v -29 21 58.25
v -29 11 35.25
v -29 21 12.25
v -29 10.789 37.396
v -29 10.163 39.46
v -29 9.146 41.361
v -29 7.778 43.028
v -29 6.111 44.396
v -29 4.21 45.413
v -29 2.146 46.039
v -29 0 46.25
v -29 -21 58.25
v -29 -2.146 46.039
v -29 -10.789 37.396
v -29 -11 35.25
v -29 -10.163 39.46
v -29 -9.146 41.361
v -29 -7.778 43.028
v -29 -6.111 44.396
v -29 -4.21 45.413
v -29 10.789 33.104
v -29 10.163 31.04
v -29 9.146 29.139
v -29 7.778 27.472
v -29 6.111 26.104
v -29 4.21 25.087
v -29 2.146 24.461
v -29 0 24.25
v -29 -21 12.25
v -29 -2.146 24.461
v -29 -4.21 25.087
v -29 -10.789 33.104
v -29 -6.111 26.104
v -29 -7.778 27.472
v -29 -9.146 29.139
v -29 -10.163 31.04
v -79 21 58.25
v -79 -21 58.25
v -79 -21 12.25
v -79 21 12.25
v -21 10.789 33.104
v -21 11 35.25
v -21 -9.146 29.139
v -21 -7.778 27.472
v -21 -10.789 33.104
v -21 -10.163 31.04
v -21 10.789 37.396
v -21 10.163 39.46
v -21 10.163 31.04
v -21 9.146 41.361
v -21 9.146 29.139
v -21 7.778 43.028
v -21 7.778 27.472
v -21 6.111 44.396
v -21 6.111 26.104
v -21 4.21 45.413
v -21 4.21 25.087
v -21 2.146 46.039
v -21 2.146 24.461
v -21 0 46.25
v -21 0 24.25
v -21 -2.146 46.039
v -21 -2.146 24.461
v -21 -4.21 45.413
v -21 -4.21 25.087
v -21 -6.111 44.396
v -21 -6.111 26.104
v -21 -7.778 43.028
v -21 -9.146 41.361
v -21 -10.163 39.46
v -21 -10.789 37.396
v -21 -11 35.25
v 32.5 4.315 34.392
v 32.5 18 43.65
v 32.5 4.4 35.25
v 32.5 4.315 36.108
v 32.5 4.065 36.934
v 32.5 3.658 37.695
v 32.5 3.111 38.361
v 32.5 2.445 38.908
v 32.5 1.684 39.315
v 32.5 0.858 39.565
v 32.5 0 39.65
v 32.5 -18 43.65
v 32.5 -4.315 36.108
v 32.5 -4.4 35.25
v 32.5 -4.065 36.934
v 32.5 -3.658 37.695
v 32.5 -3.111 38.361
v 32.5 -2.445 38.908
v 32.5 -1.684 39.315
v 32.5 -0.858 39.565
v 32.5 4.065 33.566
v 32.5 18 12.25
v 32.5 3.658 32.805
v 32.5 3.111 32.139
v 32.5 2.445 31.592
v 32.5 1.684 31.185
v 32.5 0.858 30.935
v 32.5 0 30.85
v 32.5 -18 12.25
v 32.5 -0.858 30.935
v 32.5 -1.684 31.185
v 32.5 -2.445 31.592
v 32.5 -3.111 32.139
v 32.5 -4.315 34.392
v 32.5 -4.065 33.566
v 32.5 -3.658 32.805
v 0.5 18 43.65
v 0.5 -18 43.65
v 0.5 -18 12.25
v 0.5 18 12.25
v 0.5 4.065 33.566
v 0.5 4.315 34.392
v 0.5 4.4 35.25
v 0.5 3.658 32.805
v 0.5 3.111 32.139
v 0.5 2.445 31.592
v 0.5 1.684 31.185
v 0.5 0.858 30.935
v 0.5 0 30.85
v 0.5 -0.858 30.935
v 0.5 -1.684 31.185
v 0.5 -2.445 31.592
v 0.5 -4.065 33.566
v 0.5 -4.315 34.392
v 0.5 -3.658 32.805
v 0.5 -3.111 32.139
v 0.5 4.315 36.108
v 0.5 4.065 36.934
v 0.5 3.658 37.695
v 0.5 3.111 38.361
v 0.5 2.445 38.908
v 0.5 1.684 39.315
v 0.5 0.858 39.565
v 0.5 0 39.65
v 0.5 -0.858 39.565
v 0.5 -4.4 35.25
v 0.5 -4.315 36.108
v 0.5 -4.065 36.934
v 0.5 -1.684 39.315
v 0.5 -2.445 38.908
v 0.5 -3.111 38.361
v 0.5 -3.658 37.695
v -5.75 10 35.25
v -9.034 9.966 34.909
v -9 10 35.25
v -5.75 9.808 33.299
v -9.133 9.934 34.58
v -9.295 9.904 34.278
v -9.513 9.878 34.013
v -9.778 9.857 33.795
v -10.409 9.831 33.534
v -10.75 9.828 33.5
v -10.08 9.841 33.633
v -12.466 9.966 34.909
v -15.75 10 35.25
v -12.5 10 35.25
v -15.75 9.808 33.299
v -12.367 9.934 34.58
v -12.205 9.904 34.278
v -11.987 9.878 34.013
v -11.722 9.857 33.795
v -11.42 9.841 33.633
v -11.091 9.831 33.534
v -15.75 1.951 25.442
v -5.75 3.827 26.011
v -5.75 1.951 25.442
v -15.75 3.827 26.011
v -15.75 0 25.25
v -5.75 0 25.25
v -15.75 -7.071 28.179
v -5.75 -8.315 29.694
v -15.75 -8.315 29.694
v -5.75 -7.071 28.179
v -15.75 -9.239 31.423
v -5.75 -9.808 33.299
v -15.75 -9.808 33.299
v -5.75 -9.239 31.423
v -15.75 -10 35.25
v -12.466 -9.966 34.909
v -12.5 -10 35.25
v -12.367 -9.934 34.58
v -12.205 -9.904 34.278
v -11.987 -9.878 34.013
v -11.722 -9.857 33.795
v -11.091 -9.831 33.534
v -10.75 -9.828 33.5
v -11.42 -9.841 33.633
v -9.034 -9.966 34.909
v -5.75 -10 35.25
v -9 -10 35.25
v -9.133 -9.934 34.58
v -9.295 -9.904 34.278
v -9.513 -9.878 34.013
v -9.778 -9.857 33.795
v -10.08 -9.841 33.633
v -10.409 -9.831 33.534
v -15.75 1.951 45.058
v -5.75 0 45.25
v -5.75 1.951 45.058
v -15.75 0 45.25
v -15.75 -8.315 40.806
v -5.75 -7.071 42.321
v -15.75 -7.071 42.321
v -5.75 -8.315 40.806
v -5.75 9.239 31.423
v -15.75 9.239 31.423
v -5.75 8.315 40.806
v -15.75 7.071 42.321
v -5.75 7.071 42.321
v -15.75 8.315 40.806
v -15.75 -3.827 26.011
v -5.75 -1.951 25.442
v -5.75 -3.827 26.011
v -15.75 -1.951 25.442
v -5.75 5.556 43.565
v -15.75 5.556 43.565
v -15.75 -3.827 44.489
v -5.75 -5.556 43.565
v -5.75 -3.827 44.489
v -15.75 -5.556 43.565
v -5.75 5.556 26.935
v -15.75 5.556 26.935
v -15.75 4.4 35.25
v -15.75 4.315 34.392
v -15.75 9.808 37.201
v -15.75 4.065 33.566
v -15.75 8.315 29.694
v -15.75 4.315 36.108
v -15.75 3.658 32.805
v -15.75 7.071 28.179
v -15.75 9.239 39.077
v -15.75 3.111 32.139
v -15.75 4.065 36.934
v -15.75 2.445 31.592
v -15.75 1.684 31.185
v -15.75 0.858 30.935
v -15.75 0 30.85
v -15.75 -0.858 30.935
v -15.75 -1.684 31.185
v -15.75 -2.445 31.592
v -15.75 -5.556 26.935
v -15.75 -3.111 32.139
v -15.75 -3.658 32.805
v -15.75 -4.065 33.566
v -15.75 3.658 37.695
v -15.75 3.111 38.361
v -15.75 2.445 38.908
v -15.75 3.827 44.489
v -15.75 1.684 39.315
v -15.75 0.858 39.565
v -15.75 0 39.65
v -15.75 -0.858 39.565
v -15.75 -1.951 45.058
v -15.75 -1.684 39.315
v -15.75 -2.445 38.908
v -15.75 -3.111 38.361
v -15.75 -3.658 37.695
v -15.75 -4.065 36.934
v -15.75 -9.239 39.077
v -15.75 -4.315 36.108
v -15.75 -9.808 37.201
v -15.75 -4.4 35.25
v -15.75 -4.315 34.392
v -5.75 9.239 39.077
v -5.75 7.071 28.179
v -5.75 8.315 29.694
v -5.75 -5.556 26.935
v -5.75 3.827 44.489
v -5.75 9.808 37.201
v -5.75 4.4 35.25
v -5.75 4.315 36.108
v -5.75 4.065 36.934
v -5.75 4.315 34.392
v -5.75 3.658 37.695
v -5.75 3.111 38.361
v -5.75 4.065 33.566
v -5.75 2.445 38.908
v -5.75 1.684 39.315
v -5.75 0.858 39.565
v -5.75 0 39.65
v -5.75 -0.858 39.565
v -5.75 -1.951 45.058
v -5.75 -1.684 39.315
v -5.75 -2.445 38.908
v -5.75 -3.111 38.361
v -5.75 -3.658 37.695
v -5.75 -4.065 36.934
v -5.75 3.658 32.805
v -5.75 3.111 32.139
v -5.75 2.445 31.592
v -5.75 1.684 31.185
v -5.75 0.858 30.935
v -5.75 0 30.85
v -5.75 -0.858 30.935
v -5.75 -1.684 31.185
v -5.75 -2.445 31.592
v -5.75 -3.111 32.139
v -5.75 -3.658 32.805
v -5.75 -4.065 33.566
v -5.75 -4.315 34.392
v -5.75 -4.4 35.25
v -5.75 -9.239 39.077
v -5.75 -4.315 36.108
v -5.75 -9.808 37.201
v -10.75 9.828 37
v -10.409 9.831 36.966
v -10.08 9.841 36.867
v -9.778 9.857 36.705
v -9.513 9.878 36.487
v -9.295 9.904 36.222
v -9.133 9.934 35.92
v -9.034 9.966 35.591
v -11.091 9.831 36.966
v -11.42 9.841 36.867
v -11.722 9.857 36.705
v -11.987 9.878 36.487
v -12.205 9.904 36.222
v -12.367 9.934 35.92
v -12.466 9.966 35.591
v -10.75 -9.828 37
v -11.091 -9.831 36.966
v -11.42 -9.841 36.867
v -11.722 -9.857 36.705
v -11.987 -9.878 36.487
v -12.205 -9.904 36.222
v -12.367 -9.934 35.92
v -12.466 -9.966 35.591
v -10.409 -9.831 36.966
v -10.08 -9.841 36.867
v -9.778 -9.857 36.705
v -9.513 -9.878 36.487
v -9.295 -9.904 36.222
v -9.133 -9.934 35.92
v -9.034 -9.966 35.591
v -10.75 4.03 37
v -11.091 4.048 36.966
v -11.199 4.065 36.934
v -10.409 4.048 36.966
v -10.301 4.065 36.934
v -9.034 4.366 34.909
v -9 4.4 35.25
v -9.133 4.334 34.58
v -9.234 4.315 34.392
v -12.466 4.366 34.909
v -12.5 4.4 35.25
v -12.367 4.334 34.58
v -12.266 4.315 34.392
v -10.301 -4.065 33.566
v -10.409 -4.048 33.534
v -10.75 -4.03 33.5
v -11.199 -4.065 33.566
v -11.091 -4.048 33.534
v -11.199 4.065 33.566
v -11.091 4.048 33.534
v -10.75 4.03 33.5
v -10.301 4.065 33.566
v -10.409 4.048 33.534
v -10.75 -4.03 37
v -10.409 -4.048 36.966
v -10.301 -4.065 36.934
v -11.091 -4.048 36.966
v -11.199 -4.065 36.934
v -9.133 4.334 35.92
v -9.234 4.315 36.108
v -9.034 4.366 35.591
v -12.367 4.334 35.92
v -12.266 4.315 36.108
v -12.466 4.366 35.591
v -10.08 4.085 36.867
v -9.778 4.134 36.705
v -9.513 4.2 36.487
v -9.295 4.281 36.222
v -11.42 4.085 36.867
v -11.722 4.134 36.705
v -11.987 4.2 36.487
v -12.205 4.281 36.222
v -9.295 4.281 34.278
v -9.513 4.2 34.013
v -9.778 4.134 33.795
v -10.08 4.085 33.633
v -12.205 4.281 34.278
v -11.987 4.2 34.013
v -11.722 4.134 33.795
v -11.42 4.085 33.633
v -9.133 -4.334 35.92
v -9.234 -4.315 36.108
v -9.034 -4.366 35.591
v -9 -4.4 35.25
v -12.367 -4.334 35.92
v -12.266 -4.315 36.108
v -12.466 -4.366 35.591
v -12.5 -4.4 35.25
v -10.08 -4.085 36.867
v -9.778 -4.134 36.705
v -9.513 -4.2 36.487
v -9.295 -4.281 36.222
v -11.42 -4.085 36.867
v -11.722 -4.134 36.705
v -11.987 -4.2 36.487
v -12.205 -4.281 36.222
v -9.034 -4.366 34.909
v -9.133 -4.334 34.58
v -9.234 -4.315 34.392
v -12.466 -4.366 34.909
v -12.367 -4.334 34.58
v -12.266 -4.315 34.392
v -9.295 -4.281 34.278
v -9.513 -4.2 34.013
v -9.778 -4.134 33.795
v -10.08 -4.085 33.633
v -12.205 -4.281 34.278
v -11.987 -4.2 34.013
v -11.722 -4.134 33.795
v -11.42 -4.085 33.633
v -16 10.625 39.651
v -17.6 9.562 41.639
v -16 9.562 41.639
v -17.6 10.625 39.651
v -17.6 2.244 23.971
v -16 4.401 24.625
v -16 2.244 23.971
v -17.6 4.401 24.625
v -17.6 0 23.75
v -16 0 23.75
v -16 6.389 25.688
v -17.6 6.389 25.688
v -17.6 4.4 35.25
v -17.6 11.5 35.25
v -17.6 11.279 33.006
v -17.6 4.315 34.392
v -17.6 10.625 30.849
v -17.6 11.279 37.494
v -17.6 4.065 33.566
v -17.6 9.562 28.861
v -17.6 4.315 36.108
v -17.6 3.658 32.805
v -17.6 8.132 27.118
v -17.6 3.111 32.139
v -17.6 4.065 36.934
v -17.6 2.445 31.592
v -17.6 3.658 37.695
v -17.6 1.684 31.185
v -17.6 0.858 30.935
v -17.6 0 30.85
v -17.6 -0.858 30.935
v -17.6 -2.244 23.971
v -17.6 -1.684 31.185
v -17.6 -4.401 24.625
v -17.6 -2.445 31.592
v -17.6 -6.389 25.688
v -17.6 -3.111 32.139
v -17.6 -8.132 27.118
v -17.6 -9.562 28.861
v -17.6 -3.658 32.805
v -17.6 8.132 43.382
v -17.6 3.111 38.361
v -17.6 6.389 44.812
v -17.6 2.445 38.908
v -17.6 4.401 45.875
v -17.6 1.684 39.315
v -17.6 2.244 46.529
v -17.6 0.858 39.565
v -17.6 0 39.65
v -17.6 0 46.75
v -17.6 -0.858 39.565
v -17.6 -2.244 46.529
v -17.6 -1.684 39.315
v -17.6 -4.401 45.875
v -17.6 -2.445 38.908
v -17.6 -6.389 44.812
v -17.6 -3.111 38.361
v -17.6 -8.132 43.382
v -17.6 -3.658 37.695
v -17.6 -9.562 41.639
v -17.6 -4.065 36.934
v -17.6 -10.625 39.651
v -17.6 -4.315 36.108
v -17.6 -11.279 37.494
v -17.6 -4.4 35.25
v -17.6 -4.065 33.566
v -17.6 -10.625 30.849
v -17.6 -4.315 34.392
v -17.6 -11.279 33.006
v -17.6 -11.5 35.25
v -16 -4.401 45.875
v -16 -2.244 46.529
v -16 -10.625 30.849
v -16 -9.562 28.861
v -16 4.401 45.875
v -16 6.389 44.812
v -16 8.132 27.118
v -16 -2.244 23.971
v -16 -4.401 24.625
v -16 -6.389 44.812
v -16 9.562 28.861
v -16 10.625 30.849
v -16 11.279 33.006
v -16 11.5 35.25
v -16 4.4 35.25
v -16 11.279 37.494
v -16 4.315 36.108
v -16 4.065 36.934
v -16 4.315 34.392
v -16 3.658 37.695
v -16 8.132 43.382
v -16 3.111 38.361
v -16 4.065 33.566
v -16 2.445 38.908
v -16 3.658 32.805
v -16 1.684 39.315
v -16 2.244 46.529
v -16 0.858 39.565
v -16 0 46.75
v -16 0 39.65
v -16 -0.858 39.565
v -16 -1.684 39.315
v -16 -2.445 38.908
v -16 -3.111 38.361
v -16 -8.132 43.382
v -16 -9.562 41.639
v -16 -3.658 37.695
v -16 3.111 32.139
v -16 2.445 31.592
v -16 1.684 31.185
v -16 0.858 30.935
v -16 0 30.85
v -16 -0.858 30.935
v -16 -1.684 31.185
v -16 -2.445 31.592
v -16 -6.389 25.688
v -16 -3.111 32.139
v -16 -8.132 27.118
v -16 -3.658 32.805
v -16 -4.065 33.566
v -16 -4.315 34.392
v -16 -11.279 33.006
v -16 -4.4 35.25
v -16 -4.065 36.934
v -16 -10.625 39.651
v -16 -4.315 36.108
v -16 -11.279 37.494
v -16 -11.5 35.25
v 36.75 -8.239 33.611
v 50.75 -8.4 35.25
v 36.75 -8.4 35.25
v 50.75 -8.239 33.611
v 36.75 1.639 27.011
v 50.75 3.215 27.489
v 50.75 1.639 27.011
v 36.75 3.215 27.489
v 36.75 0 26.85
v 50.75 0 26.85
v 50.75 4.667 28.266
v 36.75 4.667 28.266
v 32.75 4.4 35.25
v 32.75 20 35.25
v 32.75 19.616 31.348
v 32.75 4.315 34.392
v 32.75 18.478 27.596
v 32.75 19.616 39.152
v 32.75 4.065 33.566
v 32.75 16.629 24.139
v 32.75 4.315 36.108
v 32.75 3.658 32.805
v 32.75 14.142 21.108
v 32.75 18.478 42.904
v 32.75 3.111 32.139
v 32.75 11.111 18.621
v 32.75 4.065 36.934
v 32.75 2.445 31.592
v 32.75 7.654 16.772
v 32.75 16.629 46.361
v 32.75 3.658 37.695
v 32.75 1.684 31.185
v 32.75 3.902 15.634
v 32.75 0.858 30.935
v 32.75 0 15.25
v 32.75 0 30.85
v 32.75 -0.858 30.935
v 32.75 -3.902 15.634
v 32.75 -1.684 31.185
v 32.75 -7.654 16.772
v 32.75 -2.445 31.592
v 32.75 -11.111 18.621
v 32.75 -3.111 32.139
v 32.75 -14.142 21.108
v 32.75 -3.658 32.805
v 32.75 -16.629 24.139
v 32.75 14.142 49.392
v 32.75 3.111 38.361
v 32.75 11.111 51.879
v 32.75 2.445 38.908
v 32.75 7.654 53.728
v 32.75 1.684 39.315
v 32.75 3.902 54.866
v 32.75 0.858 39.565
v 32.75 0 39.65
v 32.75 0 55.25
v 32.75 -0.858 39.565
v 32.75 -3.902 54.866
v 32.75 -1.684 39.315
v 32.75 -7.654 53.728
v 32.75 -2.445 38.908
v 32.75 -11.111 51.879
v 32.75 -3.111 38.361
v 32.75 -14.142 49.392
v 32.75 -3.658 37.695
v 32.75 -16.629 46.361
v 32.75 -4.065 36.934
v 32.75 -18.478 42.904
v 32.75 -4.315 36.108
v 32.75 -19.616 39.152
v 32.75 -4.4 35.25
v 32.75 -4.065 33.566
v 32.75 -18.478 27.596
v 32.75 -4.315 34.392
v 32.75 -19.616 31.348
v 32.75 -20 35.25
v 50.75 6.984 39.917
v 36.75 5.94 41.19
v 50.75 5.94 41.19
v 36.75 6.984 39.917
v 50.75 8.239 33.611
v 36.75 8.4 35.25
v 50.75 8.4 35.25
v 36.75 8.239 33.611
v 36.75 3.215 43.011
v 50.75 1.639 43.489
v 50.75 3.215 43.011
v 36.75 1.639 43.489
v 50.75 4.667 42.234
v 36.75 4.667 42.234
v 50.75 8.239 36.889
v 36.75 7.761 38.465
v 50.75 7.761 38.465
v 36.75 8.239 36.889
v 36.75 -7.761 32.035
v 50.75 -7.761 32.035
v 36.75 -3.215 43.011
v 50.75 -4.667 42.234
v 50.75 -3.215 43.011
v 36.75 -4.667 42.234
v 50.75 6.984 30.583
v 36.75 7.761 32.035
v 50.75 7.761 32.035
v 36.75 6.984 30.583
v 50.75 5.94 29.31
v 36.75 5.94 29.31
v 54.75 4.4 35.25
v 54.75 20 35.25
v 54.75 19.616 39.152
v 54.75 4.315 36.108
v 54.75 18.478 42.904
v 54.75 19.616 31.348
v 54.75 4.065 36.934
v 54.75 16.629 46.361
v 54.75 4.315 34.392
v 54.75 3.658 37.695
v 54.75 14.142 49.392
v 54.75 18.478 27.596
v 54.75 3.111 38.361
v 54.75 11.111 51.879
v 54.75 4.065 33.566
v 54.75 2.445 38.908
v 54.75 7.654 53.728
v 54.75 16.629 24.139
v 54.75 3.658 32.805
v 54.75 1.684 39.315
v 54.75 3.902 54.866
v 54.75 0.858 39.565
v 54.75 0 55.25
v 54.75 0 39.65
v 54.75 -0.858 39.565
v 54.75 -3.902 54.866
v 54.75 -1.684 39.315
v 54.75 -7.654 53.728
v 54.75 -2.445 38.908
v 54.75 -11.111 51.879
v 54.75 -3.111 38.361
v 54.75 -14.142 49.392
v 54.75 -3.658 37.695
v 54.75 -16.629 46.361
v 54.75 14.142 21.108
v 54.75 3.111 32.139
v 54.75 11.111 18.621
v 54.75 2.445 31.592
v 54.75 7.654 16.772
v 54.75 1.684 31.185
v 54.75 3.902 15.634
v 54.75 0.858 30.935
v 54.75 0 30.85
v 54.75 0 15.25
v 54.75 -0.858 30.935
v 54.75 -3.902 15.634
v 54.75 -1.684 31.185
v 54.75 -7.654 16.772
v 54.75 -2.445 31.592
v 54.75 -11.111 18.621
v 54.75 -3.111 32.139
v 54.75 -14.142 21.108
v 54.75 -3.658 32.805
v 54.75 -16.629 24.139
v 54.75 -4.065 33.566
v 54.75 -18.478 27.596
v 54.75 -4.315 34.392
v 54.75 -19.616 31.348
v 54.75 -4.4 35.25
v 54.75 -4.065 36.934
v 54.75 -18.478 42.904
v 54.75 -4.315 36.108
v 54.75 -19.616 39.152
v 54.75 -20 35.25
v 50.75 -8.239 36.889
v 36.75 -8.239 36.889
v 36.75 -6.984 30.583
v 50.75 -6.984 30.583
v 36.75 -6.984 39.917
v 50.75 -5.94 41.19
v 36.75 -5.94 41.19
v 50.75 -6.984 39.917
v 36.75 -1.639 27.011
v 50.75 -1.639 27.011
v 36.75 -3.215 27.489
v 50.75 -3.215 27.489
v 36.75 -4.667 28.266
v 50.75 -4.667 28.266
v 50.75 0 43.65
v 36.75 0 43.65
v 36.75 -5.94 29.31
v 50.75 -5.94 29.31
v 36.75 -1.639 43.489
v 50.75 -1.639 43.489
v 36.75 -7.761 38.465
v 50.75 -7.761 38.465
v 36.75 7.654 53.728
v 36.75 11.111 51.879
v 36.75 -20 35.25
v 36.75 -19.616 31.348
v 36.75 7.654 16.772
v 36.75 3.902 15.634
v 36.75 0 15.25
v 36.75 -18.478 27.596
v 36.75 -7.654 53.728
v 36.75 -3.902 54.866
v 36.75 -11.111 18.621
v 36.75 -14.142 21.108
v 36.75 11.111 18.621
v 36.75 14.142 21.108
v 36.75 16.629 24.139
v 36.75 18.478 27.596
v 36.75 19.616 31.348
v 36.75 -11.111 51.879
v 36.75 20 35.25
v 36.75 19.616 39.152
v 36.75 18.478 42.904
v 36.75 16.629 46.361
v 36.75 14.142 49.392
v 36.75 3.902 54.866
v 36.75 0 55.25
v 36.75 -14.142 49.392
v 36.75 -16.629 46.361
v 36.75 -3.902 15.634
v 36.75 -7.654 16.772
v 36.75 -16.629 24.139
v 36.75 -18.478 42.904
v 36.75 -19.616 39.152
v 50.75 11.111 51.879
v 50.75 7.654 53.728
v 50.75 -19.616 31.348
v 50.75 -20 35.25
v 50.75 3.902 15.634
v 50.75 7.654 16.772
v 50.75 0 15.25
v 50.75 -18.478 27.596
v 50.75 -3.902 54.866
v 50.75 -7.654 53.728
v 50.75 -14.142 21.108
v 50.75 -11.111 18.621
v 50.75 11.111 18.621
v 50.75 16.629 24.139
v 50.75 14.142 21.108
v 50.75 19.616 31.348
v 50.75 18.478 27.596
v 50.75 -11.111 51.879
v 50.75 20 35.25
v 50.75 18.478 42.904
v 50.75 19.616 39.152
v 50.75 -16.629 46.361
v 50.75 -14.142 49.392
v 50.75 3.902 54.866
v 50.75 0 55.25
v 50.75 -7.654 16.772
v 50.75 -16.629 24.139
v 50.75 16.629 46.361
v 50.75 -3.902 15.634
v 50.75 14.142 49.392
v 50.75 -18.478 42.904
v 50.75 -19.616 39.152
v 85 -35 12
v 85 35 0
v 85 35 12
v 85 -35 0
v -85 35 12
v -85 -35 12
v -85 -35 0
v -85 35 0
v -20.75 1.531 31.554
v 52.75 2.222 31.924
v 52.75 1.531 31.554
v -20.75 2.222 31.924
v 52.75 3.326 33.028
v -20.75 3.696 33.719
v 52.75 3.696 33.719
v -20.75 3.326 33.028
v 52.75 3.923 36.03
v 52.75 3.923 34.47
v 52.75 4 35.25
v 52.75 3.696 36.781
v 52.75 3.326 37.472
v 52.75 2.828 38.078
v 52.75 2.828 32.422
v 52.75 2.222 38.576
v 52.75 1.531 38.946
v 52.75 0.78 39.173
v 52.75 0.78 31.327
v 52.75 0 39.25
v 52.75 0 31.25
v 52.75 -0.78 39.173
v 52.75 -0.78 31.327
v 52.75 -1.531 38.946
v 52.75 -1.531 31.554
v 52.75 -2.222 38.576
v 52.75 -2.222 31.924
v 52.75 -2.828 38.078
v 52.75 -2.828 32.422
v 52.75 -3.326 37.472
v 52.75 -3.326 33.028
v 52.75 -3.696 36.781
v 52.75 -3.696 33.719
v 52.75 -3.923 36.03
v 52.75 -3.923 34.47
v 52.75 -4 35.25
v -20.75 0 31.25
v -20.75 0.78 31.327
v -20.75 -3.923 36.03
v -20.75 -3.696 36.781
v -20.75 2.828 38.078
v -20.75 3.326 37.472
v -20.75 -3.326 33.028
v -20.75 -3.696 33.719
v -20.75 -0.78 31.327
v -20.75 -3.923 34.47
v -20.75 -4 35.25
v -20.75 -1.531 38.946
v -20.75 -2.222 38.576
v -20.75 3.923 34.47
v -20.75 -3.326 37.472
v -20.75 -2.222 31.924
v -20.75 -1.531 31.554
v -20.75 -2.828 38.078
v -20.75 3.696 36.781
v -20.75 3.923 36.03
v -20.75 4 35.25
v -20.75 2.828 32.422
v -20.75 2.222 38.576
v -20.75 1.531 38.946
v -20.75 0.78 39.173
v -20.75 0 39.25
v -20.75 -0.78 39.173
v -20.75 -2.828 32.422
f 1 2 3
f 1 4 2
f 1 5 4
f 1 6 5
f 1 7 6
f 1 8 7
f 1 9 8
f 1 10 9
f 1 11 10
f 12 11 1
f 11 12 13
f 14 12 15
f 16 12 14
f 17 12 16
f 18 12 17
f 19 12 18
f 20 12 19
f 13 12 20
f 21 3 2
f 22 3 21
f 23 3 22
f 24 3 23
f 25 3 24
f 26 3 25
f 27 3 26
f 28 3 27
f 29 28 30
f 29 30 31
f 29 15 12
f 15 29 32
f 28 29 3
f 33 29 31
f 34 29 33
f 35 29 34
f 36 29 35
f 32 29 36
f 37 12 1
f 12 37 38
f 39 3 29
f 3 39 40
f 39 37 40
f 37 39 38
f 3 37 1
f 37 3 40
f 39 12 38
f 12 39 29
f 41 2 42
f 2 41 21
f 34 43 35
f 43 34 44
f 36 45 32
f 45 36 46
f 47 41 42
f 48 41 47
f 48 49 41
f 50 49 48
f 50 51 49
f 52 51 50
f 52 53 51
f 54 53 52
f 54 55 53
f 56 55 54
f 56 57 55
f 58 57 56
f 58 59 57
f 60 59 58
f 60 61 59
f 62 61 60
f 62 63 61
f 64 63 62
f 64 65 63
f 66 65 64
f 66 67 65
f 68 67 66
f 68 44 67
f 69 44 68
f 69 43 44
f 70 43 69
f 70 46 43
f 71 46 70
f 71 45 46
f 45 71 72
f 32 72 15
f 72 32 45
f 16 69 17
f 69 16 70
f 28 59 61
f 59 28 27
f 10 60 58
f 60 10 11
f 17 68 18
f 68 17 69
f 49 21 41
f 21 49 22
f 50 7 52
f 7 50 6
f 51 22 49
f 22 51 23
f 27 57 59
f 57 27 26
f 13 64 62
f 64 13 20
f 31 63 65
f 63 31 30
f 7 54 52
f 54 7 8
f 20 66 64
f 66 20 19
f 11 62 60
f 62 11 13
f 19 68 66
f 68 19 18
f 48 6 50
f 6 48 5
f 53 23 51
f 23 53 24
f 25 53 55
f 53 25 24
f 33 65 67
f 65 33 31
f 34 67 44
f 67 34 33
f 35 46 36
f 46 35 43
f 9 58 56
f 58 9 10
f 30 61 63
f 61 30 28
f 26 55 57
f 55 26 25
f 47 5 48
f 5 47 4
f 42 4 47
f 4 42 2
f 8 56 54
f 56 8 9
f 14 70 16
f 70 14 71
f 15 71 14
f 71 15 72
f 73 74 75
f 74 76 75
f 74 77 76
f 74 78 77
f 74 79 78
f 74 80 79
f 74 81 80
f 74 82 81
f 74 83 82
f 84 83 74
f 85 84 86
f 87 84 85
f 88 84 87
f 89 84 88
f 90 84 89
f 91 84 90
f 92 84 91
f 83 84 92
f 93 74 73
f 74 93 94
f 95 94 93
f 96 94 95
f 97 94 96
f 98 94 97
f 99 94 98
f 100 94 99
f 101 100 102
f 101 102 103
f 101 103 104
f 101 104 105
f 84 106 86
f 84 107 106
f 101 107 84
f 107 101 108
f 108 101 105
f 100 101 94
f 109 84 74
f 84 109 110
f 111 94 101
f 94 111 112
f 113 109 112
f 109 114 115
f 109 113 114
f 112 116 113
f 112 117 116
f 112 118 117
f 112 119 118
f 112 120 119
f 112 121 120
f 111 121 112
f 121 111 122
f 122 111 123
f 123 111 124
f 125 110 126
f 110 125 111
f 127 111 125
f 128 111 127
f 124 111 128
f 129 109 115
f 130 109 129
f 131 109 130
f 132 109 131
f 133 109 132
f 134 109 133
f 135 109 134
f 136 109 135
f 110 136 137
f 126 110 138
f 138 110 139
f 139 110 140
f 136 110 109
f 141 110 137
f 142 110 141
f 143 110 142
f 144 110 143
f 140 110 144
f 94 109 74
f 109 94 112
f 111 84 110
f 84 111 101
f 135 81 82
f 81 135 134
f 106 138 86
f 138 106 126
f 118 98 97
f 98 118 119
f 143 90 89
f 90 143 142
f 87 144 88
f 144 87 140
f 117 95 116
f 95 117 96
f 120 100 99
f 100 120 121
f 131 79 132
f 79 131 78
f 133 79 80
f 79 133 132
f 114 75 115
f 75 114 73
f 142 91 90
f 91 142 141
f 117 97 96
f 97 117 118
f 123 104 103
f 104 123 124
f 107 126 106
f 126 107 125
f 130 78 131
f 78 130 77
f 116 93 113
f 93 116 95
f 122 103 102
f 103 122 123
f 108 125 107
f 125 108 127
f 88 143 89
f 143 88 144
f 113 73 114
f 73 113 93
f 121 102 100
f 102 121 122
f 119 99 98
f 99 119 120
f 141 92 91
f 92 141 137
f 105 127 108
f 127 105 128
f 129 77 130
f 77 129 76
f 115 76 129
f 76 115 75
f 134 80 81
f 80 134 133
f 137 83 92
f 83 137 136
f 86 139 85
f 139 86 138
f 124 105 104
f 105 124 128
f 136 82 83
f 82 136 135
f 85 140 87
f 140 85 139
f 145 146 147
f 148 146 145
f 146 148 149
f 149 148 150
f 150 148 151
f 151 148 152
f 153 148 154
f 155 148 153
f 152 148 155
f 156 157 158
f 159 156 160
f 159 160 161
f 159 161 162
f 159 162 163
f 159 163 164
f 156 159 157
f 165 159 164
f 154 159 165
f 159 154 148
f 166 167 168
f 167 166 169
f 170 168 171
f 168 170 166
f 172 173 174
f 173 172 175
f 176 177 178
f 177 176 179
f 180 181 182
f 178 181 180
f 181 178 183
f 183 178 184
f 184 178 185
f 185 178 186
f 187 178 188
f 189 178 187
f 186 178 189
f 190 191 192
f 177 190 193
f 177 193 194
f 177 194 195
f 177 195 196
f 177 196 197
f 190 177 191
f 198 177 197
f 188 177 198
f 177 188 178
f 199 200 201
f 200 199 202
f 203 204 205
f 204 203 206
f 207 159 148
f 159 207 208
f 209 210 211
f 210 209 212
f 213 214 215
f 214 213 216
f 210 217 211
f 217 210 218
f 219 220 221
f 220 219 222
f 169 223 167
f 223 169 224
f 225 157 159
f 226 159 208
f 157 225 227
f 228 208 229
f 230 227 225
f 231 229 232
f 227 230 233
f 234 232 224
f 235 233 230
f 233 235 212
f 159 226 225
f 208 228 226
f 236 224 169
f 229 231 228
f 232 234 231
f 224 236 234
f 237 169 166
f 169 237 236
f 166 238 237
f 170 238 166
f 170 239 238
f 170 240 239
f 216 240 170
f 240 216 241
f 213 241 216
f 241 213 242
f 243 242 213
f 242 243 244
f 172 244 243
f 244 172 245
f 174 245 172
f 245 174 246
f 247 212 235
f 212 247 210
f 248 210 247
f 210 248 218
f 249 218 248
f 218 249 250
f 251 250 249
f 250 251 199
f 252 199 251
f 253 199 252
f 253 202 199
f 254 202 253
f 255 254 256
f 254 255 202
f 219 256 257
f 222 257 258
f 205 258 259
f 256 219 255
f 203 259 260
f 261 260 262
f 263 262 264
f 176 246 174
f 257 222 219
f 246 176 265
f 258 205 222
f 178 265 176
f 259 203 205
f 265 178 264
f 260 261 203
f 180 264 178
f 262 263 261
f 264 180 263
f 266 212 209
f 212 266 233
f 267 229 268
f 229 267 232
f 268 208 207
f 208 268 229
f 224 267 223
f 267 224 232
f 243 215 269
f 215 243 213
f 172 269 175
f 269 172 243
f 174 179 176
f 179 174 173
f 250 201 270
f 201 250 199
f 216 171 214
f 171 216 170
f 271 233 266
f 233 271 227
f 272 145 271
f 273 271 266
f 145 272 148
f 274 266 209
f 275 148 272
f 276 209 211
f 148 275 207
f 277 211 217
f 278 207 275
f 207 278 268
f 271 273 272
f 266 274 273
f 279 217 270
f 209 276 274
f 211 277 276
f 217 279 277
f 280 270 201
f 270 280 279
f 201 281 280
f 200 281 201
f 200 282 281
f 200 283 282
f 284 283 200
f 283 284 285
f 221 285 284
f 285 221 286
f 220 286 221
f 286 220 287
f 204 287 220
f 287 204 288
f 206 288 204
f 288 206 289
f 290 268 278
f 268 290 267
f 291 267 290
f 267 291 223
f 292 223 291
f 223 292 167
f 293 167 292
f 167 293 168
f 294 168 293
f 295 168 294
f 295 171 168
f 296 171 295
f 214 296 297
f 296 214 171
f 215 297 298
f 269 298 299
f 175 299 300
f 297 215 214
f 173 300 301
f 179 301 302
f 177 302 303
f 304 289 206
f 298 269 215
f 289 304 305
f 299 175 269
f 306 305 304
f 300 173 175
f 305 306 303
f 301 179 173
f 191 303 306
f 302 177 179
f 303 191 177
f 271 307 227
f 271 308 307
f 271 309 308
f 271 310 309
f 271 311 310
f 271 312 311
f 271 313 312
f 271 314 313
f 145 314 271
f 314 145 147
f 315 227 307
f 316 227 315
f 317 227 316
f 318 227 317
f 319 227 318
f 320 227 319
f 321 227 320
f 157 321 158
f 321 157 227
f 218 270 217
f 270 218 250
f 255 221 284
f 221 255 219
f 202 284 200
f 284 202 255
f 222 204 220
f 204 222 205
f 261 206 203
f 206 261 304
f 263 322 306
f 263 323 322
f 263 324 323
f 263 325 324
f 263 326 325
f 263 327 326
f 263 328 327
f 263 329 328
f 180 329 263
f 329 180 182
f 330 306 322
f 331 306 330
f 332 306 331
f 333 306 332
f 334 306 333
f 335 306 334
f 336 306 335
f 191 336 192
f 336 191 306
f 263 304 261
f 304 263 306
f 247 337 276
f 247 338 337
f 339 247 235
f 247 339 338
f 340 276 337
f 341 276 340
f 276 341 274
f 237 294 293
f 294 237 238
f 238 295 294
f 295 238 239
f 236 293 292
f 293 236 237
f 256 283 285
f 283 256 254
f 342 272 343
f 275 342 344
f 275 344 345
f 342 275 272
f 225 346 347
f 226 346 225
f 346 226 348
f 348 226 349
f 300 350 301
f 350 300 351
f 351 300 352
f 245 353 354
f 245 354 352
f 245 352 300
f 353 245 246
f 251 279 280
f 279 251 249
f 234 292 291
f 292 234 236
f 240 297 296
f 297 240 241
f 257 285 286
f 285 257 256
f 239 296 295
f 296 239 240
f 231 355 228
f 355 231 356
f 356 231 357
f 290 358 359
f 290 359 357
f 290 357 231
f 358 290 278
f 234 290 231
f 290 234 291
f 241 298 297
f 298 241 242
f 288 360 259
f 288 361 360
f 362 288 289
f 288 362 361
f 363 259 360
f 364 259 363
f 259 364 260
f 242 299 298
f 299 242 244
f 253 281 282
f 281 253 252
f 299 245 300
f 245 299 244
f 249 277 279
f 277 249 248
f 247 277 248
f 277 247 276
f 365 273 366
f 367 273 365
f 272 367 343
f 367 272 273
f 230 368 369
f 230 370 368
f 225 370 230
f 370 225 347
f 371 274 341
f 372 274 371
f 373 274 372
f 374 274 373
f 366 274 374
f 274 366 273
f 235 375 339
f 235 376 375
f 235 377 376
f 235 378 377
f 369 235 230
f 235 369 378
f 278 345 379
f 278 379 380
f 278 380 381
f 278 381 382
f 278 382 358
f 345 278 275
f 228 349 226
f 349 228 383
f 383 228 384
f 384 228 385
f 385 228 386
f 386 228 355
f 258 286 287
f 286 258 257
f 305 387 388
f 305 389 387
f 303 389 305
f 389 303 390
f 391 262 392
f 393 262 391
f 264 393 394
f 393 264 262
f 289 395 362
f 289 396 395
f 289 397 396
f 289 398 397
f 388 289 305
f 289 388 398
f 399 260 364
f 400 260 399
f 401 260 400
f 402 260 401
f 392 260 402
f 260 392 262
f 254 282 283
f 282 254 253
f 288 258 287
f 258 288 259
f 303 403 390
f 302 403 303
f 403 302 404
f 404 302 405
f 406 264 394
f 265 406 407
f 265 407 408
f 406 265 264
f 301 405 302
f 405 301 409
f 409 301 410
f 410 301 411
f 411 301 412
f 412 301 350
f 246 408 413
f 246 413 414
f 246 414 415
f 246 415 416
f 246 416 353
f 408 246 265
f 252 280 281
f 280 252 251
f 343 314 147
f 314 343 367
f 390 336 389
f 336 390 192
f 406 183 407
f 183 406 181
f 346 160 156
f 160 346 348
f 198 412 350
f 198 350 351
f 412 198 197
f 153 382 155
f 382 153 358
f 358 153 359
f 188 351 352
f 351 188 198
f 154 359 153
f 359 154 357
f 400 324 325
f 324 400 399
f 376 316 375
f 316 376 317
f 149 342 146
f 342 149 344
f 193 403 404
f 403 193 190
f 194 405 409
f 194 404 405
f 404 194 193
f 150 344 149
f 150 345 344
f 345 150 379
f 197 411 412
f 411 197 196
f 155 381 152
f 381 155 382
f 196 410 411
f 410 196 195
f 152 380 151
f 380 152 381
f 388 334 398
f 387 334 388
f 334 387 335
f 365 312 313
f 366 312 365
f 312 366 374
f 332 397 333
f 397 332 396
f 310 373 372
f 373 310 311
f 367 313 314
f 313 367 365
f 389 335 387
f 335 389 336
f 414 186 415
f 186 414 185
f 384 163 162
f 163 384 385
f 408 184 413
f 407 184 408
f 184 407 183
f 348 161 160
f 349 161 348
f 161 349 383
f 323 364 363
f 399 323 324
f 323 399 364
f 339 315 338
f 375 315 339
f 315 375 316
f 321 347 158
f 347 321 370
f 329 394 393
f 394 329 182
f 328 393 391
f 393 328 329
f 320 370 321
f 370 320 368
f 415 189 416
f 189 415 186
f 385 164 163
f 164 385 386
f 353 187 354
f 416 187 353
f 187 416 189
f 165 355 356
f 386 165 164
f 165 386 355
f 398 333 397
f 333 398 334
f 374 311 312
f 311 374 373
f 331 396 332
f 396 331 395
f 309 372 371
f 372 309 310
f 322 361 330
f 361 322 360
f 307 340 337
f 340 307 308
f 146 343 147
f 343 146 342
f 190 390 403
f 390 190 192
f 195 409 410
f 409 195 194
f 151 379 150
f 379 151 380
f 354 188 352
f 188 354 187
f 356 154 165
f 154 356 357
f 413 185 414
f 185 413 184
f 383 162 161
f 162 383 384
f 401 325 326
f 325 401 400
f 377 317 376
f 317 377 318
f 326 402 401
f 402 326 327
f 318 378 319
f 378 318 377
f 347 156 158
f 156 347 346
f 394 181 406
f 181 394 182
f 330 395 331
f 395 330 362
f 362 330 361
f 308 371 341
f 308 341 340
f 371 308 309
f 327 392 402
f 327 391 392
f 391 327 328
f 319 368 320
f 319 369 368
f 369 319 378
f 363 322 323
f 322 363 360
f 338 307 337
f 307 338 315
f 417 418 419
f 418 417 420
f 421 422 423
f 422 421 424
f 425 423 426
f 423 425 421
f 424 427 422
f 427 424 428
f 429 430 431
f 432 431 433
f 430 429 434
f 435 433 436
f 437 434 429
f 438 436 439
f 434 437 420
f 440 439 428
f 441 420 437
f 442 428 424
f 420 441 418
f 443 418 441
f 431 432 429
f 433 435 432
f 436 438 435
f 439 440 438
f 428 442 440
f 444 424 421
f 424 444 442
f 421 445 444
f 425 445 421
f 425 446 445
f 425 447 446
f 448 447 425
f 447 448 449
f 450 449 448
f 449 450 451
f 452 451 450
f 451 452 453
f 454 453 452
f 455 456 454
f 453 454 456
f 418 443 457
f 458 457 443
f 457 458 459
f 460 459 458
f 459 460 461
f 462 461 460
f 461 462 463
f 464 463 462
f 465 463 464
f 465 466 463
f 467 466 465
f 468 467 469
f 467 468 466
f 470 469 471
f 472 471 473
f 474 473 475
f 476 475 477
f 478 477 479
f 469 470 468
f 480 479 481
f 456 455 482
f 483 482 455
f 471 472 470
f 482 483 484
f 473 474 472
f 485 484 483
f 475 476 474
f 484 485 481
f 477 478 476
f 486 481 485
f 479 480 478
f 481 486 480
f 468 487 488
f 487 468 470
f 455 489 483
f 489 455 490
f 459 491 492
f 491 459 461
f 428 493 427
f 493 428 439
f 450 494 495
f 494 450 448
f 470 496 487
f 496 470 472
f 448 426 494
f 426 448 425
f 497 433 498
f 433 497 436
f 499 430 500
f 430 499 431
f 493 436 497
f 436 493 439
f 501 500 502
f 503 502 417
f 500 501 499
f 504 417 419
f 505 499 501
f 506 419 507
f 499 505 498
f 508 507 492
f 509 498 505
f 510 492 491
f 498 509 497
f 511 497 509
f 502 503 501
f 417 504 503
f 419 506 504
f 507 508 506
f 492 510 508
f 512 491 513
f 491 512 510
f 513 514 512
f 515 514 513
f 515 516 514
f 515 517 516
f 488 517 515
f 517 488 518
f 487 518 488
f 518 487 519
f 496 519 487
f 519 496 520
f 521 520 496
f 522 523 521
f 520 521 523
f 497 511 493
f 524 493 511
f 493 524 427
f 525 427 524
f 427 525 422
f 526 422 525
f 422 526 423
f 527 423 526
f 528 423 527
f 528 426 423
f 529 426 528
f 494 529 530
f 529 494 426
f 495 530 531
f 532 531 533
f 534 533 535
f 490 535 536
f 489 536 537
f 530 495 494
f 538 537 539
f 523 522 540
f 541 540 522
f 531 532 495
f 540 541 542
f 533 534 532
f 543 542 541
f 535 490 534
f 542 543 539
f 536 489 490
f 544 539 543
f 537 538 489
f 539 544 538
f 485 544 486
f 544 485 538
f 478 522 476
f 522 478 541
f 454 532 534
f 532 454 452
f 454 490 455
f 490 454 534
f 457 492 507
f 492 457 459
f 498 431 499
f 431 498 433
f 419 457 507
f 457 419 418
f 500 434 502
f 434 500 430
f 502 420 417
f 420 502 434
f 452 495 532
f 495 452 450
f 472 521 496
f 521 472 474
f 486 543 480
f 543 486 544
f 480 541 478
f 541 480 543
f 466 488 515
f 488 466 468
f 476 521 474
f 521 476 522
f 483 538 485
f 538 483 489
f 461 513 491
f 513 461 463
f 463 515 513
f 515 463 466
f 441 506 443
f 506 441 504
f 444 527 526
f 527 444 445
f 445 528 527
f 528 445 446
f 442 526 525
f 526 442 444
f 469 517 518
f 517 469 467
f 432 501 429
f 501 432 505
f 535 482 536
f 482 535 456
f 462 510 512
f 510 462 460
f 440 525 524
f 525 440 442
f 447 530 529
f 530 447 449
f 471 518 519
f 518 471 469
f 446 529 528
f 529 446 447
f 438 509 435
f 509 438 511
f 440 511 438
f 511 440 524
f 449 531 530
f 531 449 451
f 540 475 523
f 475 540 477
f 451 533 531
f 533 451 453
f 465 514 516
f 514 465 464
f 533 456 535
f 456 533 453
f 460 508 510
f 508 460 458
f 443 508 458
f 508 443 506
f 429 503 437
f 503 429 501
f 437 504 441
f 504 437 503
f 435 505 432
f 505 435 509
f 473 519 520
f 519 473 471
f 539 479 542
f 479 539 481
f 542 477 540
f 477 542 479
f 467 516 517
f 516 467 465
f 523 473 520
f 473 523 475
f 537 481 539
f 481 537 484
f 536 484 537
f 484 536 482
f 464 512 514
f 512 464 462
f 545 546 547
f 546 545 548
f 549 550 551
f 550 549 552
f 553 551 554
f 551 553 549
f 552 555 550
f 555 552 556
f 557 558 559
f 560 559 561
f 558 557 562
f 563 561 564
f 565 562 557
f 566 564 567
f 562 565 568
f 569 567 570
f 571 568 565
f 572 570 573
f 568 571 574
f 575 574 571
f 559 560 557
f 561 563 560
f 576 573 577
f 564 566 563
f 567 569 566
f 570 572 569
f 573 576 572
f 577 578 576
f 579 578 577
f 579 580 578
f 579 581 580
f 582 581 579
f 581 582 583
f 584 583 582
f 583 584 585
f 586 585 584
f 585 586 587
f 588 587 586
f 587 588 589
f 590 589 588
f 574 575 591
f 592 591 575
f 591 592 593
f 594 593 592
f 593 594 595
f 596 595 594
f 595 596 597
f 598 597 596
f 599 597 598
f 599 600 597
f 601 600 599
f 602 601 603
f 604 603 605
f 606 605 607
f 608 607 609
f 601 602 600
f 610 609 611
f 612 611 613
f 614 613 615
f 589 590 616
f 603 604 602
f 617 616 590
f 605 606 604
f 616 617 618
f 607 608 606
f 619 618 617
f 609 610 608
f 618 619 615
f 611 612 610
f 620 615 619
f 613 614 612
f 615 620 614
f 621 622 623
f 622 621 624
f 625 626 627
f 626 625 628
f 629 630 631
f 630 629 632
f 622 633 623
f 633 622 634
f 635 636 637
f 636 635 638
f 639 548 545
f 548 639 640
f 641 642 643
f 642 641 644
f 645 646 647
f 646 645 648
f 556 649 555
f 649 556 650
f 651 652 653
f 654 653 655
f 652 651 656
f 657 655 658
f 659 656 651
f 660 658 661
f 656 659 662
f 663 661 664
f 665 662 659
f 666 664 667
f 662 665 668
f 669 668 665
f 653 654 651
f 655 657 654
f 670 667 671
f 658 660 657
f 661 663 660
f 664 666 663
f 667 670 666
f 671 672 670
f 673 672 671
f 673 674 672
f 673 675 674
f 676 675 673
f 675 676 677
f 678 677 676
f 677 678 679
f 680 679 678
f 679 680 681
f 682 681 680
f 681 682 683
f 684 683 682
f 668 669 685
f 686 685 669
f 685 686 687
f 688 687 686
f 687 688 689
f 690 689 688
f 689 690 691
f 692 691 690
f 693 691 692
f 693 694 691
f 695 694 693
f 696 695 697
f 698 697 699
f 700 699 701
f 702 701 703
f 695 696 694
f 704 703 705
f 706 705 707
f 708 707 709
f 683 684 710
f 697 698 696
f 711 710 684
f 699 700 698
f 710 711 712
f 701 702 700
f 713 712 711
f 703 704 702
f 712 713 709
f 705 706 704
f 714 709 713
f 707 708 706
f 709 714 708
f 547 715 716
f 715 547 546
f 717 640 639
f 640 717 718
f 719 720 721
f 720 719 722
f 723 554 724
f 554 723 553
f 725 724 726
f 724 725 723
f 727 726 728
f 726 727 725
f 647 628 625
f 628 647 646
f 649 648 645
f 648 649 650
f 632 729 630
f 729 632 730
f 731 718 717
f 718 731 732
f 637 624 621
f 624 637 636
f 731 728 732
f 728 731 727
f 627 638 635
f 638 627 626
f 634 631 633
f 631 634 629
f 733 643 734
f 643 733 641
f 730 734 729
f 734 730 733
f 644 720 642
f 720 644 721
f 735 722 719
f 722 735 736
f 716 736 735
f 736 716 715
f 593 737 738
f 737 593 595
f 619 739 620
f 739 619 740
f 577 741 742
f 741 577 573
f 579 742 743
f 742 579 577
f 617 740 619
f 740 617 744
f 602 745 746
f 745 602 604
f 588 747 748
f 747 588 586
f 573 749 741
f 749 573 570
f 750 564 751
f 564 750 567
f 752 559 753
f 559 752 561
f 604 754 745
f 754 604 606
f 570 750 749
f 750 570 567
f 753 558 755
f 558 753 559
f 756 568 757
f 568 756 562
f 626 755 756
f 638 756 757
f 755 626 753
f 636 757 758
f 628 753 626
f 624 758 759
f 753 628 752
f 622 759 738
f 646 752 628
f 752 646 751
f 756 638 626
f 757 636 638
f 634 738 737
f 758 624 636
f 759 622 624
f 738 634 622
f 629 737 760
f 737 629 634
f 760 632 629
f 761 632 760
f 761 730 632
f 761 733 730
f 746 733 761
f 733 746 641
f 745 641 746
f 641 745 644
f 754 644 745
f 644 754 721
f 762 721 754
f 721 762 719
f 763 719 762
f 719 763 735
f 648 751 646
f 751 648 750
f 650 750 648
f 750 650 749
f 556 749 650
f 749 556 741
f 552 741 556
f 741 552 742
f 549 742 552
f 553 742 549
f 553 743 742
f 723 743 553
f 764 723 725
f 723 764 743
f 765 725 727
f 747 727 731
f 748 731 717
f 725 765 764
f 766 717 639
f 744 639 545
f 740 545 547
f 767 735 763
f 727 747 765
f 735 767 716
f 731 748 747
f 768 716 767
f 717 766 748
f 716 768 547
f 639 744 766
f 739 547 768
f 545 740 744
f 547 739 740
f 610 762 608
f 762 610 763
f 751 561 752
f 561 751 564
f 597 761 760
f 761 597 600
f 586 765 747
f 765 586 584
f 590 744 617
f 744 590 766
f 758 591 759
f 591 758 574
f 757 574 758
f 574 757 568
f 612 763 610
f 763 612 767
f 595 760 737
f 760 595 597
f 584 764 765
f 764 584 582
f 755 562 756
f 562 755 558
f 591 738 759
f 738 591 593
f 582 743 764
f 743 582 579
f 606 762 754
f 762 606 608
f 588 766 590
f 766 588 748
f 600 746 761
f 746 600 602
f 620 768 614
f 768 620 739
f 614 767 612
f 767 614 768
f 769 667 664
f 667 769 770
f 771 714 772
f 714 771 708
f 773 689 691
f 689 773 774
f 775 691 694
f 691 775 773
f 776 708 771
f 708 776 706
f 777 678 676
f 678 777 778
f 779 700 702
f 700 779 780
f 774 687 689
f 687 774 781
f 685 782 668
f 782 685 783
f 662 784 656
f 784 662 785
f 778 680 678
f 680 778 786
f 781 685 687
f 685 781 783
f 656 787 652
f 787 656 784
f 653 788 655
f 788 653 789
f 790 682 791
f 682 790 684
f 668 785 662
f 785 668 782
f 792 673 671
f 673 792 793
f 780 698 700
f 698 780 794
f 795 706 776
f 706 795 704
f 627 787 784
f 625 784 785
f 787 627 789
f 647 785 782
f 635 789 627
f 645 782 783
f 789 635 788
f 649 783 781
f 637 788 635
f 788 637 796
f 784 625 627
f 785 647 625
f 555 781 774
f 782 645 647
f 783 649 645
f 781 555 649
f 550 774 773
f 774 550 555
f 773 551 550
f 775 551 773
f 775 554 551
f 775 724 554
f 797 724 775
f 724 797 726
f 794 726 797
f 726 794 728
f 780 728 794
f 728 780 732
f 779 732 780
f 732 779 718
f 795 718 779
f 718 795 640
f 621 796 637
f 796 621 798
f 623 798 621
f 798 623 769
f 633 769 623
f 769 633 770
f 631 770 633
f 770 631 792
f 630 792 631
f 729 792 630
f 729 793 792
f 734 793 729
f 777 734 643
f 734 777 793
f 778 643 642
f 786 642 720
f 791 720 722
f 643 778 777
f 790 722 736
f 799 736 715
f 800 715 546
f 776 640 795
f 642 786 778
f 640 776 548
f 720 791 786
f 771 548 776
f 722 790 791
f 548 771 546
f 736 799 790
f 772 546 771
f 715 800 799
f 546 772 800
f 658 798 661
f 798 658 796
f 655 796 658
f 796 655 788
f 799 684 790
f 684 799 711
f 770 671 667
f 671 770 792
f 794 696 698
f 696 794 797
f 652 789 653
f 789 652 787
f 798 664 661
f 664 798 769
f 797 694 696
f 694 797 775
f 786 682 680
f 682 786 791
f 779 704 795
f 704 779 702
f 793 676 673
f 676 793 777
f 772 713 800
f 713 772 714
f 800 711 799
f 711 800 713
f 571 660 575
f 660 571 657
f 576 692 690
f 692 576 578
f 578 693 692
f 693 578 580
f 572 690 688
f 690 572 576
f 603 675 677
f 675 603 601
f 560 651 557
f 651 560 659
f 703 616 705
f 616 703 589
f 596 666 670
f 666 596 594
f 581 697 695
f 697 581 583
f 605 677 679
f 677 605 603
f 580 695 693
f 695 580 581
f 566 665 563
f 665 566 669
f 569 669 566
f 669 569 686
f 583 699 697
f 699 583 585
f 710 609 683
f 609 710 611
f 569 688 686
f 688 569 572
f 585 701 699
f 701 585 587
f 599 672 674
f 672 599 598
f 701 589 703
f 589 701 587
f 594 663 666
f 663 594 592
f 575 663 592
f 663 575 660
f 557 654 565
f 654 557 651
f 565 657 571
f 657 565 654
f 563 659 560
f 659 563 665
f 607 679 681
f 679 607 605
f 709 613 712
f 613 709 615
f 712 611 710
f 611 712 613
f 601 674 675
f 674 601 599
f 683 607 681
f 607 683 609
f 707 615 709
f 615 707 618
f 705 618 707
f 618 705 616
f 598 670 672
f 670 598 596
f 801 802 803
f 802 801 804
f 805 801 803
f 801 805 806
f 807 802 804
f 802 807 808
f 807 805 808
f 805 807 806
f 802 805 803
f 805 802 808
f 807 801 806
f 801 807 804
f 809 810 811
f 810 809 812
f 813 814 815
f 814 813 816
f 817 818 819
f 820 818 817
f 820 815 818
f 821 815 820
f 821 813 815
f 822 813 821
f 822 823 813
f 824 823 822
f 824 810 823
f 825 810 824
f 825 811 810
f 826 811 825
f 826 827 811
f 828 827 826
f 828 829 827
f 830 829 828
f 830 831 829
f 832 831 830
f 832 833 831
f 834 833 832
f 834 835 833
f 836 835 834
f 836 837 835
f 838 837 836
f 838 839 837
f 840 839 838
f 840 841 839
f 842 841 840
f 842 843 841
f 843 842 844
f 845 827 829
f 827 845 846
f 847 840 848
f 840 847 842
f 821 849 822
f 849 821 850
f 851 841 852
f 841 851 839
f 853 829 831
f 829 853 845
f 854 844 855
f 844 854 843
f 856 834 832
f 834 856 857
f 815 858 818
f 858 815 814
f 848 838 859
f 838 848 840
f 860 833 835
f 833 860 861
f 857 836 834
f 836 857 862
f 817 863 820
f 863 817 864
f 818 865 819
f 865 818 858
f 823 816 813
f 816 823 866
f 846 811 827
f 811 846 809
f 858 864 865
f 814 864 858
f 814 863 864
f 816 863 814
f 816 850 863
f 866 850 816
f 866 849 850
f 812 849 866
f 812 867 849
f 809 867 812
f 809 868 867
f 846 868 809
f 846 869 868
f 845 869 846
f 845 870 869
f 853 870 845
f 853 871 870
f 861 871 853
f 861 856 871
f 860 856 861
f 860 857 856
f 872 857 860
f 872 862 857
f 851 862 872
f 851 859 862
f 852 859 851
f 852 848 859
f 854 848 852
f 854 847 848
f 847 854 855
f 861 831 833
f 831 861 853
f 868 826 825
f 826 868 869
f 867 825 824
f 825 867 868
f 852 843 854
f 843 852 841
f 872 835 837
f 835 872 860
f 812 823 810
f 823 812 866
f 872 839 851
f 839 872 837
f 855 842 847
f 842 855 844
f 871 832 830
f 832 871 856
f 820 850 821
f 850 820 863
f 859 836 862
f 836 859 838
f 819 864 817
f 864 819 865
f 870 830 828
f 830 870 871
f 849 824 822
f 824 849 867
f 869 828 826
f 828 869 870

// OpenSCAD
$fn = 32;

// ------------------------------------------------------------------------
// Motor drive station: motor 50 x 46 mm, shaft d8, pulley d40
// Every part is its own module, assembly() places every instance.
// ------------------------------------------------------------------------

// --- part 1 ---
module station_bed() {
  difference() {
    translate([-85, -35, 0]) cube([170, 70, 12]);
  }
}

// --- part 2 ---
module drive_motor() {
  union() {
    translate([-25, -21, 0]) cube([50, 42, 46]);
    translate([29, 0, 23]) rotate([0, 90, 0]) cylinder(h = 8, d = 22, center = true);
  }
}

// --- part 3 ---
module pillow_block() {
  difference() {
    translate([-16, -18, 0]) cube([32, 36, 31.4]);
    translate([0, 0, 23]) rotate([0, 90, 0]) cylinder(h = 34, d = 8.8, center = true);
  }
}

// --- part 4 ---
module drive_shaft() {
  translate([0, 0, -36.75]) cylinder(h = 73.5, d = 8);
}

// --- part 5 ---
module shaft_collar() {
  difference() {
    cylinder(h = 10, d = 20);
    translate([0, 0, -1]) cylinder(h = 12, d = 8.8);
    translate([0, 0, 5]) rotate([90, 0, 0]) cylinder(h = 22, d = 3.5, center = true);
  }
}

// --- part 6 ---
module collar_washer() {
  difference() {
      translate([0, 0, 0]) cylinder(h = 1.6, d = 23);
      translate([0, 0, -1]) cylinder(h = 3.6, d = 8.8);
    }
}

// --- part 7 ---
module drive_pulley() {
  difference() {
    union() {
      cylinder(h = 22, d = 16.8);
      cylinder(h = 4, d = 40);
      translate([0, 0, 18]) cylinder(h = 4, d = 40);
    }
    translate([0, 0, -1]) cylinder(h = 24, d = 8.8);
  }
}

// --- assembly ---
module assembly() {
  color([0.80, 0.24, 0.20]) translate([0, 0, 0]) rotate([0, 0, 0]) station_bed();
  color([0.20, 0.45, 0.75]) translate([-54, 0, 12.25]) rotate([0, 0, 0]) drive_motor();
  color([0.25, 0.62, 0.32]) translate([16.5, 0, 12.25]) rotate([0, 0, 0]) pillow_block();
  color([0.92, 0.70, 0.18]) translate([16, 0, 35.25]) rotate([0, 90, 0]) drive_shaft();
  color([0.58, 0.35, 0.70]) translate([-15.75, 0, 35.25]) rotate([0, 90, 0]) shaft_collar();
  color([0.16, 0.66, 0.66]) translate([-17.6, 0, 35.25]) rotate([0, 90, 0]) collar_washer();
  color([0.85, 0.48, 0.18]) translate([32.75, 0, 35.25]) rotate([0, 90, 0]) drive_pulley();
}

assembly();
